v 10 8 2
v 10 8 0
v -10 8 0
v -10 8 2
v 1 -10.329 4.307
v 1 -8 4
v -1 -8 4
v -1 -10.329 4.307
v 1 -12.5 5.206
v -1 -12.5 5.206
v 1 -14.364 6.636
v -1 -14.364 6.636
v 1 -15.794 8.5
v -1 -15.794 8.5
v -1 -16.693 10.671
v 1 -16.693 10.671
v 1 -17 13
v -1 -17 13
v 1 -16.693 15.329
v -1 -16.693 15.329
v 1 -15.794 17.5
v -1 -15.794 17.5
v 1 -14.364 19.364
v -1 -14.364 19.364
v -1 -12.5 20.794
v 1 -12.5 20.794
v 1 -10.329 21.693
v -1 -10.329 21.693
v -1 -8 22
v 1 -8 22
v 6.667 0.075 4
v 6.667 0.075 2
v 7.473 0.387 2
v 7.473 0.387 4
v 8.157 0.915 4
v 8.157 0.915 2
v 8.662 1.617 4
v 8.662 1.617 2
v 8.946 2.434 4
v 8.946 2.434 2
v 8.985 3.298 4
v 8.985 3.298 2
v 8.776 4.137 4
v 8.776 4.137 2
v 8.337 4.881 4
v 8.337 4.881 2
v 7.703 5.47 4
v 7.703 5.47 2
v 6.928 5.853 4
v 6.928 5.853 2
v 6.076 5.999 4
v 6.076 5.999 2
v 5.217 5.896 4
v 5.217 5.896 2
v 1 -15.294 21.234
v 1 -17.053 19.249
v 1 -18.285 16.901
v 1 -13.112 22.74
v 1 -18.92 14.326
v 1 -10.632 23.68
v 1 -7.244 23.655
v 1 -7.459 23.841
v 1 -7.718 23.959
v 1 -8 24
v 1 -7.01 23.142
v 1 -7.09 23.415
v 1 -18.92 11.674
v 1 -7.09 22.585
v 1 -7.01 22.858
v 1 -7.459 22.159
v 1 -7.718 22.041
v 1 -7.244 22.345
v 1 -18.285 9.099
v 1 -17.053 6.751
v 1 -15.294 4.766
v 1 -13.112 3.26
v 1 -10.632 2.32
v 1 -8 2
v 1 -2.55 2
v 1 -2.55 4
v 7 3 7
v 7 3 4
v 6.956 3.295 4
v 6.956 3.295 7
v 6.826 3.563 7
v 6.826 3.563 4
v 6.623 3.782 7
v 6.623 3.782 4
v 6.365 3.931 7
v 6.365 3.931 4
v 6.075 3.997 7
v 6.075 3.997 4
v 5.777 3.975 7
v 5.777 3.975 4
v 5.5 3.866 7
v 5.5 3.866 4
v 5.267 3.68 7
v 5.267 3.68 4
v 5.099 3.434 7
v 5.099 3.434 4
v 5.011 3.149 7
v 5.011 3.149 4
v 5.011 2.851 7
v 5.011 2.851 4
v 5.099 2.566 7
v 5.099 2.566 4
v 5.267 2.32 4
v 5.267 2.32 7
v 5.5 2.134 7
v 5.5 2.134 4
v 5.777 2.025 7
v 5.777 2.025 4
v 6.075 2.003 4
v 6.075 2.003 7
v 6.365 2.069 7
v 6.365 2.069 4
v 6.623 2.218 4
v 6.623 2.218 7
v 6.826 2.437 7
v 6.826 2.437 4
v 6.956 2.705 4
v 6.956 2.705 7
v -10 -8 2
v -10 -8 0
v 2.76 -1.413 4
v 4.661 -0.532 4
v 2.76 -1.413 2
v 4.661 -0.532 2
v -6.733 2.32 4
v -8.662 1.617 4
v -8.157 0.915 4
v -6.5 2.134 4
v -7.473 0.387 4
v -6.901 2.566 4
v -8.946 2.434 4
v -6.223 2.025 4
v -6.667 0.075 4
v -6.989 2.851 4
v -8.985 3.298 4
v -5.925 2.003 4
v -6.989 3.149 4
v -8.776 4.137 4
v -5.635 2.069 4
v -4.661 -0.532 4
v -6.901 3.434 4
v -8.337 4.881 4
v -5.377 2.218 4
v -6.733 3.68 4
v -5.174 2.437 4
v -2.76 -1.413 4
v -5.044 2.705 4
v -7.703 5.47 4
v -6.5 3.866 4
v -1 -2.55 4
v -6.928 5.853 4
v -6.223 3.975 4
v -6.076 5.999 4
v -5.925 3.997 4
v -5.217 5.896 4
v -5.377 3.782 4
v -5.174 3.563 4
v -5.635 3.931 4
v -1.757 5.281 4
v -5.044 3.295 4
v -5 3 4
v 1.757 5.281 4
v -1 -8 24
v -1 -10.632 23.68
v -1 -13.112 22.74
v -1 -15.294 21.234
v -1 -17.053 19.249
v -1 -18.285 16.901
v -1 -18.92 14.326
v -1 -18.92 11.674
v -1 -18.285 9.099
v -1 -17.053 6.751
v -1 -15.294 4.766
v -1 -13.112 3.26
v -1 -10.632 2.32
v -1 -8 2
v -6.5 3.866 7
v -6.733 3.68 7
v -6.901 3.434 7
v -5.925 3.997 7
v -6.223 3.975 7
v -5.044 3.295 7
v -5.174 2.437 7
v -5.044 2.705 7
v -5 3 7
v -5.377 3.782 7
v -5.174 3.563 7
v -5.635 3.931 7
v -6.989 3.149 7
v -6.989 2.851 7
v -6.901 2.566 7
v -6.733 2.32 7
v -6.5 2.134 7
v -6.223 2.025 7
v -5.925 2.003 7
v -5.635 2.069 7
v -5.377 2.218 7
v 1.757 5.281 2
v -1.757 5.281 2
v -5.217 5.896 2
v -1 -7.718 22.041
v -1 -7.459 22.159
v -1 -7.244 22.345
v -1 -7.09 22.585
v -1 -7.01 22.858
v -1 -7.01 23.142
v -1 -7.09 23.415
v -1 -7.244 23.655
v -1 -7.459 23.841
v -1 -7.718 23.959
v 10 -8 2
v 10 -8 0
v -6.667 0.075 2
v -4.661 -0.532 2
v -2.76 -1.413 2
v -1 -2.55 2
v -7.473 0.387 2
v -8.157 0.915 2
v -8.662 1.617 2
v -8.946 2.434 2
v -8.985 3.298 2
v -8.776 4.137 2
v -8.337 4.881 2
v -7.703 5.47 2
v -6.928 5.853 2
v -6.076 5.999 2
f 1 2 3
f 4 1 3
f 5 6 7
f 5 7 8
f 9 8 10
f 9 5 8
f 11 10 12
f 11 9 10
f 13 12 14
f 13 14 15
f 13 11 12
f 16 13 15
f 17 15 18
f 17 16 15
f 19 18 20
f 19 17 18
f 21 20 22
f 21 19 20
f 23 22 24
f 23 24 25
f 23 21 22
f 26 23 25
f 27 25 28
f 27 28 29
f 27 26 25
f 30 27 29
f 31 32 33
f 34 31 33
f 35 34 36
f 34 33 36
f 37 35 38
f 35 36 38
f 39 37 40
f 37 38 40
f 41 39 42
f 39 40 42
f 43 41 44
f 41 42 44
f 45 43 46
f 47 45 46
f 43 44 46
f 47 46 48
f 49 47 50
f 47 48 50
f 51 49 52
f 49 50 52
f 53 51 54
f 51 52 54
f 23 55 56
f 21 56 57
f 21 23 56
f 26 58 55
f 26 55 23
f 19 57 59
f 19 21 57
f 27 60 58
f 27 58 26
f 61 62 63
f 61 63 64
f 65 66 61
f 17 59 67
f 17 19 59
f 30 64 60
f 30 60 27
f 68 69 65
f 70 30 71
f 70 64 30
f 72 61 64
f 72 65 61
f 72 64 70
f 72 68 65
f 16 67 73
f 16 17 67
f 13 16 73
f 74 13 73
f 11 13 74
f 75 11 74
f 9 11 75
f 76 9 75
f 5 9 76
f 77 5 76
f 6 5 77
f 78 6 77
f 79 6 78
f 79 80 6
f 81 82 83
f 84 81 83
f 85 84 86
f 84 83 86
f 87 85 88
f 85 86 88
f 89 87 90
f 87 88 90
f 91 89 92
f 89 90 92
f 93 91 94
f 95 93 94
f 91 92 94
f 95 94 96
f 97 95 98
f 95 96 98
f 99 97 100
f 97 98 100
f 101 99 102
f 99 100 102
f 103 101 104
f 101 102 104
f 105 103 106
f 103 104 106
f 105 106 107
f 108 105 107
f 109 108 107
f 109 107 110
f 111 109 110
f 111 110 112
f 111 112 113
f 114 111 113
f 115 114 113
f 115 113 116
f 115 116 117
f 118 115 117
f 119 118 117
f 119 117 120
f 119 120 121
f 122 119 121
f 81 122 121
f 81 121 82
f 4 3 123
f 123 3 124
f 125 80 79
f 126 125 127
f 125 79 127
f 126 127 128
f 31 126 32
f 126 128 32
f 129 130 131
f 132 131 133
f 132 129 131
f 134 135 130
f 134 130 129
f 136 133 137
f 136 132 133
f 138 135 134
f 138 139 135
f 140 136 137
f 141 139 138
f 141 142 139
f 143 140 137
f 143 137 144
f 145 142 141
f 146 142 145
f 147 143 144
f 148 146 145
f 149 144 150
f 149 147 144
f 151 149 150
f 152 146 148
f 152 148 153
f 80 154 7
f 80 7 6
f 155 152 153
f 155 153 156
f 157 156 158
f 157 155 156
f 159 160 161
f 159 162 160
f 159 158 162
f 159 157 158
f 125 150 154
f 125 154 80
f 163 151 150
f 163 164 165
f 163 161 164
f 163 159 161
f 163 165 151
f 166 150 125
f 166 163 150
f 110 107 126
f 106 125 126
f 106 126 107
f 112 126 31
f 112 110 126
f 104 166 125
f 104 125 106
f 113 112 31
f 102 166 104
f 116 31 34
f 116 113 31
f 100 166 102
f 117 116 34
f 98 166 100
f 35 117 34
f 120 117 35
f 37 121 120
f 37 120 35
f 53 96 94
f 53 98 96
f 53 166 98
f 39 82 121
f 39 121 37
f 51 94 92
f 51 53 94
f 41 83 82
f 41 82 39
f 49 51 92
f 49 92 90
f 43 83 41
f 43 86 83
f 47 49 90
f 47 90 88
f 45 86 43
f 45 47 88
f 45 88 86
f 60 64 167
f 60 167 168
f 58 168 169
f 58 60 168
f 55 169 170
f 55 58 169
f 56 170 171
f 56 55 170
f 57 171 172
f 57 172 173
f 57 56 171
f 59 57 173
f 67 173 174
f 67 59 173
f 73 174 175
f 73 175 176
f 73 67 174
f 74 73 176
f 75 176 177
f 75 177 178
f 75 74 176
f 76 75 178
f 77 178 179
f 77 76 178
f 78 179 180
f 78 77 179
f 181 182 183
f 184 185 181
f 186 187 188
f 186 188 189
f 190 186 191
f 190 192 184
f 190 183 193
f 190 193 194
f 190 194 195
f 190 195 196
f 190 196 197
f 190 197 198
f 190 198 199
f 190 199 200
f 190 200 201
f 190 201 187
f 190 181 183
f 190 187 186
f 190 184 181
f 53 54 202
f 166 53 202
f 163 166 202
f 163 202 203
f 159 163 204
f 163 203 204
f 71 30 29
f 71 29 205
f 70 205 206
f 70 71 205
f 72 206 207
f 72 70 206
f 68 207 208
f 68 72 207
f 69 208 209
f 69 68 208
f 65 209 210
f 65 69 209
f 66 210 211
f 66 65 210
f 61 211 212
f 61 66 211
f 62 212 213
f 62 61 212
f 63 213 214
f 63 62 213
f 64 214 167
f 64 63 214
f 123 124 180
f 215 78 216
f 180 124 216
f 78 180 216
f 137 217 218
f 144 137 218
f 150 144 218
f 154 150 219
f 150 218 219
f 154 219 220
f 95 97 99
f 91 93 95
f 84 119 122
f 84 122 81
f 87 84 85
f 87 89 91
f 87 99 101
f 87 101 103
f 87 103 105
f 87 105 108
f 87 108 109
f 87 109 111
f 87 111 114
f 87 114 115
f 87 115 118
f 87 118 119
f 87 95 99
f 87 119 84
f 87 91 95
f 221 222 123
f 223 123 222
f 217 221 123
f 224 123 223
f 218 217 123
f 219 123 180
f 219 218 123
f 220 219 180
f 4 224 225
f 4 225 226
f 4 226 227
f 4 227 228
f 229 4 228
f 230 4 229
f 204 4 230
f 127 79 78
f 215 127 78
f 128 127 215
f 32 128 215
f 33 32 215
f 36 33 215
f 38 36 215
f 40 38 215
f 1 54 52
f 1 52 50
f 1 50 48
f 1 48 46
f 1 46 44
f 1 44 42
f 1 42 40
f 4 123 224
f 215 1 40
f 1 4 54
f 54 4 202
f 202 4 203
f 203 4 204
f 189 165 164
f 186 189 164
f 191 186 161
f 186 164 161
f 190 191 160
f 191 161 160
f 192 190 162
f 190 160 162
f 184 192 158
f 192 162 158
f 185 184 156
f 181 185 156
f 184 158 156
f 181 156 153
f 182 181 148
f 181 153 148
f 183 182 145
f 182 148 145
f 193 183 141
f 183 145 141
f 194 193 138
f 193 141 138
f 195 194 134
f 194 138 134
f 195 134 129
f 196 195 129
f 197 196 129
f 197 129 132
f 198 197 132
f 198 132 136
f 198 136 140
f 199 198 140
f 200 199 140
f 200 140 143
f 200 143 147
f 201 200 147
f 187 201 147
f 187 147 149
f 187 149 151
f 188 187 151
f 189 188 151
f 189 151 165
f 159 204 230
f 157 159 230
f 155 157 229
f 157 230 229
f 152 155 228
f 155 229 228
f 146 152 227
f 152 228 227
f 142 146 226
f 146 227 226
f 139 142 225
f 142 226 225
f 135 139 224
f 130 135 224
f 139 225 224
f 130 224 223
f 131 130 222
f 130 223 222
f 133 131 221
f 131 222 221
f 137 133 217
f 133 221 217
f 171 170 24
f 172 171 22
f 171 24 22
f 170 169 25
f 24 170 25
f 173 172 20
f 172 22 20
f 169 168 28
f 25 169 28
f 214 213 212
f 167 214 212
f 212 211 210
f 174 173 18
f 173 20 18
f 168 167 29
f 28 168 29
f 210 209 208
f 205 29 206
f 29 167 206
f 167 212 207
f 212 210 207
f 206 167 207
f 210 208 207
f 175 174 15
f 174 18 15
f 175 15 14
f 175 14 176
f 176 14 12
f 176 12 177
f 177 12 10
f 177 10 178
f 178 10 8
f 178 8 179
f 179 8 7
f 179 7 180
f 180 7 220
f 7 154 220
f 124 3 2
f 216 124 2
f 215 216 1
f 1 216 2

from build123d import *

# Parameters (mm, degrees)
BOSS_EXTRUDE1_DEPTH = 2
SKETCH1_4_R         = 1
BOSS_EXTRUDE2_DEPTH = 4
SKETCH1_6_R         = 1
BOSS_EXTRUDE3_DEPTH = 7
BOSS_EXTRUDE4_DEPTH = 2


with BuildPart() as part:
    # Sketch1 → Boss-Extrude1 (new body)
    with BuildSketch(Plane.XY):
        with BuildLine():
            Line((-10, 8), (-10, -8))
            Line((-10, -8), (-1, -8))
            Line((-1, -8), (-1, -2.549928775))
            ThreePointArc((-1, -2.549928775), (-3.695211651, -0.939284269), (-6.666666667, 0.075011871))
            ThreePointArc((-6.666666667, 0.075011871), (-8.911132412, 3.724781401), (-5.217391304, 5.896122171))
            ThreePointArc((-5.217391304, 5.896122171), (0, 5.203603311), (5.217391304, 5.896122171))
            ThreePointArc((5.217391304, 5.896122171), (8.911132412, 3.724781401), (6.666666667, 0.075011871))
            ThreePointArc((6.666666667, 0.075011871), (3.695211651, -0.939284269), (1, -2.549928775))
            Line((1, -2.549928775), (1, -8))
            Line((1, -8), (10, -8))
            Line((10, -8), (10, 8))
            Line((10, 8), (-10, 8))
        make_face()
    extrude(amount=BOSS_EXTRUDE1_DEPTH)

    # Sketch1<4> → Boss-Extrude2 (add)
    with BuildSketch(Plane.XY):
        with BuildLine():
            Line((-1, -2.549928775), (-1, -8))
            Line((-1, -8), (1, -8))
            Line((1, -8), (1, -2.549928775))
            ThreePointArc((1, -2.549928775), (3.695211651, -0.939284269), (6.666666667, 0.075011871))
            ThreePointArc((6.666666667, 0.075011871), (8.911132412, 3.724781401), (5.217391304, 5.896122171))
            ThreePointArc((5.217391304, 5.896122171), (0, 5.203603311), (-5.217391304, 5.896122171))
            ThreePointArc((-5.217391304, 5.896122171), (-8.911132412, 3.724781401), (-6.666666667, 0.075011871))
            ThreePointArc((-6.666666667, 0.075011871), (-3.695211651, -0.939284269), (-1, -2.549928775))
        make_face()
        with Locations((-6, 3)):
            Circle(SKETCH1_4_R, mode=Mode.SUBTRACT)
        with Locations((6, 3)):
            Circle(SKETCH1_4_R, mode=Mode.SUBTRACT)
    extrude(amount=BOSS_EXTRUDE2_DEPTH)

    # Sketch1<6> → Boss-Extrude3 (add)
    with BuildSketch(Plane.XY):
        with Locations((-6, 3)):
            Circle(SKETCH1_6_R)
        with Locations((6, 3)):
            Circle(SKETCH1_6_R)
    extrude(amount=BOSS_EXTRUDE3_DEPTH)

    # Sketch2 → Boss-Extrude4 (add)
    with BuildSketch(Plane(origin=(1, 0, 0), x_dir=(0, 0, -1), z_dir=(1, 0, 0))):
        with BuildLine():
            Line((-2, -8), (-4, -8))
            ThreePointArc((-4, -8), (-13, -17), (-22, -8))
            ThreePointArc((-22, -8), (-23, -7), (-24, -8))
            ThreePointArc((-24, -8), (-13, -19), (-2, -8))
        make_face()
    extrude(amount=-BOSS_EXTRUDE4_DEPTH)


solid = part.part
